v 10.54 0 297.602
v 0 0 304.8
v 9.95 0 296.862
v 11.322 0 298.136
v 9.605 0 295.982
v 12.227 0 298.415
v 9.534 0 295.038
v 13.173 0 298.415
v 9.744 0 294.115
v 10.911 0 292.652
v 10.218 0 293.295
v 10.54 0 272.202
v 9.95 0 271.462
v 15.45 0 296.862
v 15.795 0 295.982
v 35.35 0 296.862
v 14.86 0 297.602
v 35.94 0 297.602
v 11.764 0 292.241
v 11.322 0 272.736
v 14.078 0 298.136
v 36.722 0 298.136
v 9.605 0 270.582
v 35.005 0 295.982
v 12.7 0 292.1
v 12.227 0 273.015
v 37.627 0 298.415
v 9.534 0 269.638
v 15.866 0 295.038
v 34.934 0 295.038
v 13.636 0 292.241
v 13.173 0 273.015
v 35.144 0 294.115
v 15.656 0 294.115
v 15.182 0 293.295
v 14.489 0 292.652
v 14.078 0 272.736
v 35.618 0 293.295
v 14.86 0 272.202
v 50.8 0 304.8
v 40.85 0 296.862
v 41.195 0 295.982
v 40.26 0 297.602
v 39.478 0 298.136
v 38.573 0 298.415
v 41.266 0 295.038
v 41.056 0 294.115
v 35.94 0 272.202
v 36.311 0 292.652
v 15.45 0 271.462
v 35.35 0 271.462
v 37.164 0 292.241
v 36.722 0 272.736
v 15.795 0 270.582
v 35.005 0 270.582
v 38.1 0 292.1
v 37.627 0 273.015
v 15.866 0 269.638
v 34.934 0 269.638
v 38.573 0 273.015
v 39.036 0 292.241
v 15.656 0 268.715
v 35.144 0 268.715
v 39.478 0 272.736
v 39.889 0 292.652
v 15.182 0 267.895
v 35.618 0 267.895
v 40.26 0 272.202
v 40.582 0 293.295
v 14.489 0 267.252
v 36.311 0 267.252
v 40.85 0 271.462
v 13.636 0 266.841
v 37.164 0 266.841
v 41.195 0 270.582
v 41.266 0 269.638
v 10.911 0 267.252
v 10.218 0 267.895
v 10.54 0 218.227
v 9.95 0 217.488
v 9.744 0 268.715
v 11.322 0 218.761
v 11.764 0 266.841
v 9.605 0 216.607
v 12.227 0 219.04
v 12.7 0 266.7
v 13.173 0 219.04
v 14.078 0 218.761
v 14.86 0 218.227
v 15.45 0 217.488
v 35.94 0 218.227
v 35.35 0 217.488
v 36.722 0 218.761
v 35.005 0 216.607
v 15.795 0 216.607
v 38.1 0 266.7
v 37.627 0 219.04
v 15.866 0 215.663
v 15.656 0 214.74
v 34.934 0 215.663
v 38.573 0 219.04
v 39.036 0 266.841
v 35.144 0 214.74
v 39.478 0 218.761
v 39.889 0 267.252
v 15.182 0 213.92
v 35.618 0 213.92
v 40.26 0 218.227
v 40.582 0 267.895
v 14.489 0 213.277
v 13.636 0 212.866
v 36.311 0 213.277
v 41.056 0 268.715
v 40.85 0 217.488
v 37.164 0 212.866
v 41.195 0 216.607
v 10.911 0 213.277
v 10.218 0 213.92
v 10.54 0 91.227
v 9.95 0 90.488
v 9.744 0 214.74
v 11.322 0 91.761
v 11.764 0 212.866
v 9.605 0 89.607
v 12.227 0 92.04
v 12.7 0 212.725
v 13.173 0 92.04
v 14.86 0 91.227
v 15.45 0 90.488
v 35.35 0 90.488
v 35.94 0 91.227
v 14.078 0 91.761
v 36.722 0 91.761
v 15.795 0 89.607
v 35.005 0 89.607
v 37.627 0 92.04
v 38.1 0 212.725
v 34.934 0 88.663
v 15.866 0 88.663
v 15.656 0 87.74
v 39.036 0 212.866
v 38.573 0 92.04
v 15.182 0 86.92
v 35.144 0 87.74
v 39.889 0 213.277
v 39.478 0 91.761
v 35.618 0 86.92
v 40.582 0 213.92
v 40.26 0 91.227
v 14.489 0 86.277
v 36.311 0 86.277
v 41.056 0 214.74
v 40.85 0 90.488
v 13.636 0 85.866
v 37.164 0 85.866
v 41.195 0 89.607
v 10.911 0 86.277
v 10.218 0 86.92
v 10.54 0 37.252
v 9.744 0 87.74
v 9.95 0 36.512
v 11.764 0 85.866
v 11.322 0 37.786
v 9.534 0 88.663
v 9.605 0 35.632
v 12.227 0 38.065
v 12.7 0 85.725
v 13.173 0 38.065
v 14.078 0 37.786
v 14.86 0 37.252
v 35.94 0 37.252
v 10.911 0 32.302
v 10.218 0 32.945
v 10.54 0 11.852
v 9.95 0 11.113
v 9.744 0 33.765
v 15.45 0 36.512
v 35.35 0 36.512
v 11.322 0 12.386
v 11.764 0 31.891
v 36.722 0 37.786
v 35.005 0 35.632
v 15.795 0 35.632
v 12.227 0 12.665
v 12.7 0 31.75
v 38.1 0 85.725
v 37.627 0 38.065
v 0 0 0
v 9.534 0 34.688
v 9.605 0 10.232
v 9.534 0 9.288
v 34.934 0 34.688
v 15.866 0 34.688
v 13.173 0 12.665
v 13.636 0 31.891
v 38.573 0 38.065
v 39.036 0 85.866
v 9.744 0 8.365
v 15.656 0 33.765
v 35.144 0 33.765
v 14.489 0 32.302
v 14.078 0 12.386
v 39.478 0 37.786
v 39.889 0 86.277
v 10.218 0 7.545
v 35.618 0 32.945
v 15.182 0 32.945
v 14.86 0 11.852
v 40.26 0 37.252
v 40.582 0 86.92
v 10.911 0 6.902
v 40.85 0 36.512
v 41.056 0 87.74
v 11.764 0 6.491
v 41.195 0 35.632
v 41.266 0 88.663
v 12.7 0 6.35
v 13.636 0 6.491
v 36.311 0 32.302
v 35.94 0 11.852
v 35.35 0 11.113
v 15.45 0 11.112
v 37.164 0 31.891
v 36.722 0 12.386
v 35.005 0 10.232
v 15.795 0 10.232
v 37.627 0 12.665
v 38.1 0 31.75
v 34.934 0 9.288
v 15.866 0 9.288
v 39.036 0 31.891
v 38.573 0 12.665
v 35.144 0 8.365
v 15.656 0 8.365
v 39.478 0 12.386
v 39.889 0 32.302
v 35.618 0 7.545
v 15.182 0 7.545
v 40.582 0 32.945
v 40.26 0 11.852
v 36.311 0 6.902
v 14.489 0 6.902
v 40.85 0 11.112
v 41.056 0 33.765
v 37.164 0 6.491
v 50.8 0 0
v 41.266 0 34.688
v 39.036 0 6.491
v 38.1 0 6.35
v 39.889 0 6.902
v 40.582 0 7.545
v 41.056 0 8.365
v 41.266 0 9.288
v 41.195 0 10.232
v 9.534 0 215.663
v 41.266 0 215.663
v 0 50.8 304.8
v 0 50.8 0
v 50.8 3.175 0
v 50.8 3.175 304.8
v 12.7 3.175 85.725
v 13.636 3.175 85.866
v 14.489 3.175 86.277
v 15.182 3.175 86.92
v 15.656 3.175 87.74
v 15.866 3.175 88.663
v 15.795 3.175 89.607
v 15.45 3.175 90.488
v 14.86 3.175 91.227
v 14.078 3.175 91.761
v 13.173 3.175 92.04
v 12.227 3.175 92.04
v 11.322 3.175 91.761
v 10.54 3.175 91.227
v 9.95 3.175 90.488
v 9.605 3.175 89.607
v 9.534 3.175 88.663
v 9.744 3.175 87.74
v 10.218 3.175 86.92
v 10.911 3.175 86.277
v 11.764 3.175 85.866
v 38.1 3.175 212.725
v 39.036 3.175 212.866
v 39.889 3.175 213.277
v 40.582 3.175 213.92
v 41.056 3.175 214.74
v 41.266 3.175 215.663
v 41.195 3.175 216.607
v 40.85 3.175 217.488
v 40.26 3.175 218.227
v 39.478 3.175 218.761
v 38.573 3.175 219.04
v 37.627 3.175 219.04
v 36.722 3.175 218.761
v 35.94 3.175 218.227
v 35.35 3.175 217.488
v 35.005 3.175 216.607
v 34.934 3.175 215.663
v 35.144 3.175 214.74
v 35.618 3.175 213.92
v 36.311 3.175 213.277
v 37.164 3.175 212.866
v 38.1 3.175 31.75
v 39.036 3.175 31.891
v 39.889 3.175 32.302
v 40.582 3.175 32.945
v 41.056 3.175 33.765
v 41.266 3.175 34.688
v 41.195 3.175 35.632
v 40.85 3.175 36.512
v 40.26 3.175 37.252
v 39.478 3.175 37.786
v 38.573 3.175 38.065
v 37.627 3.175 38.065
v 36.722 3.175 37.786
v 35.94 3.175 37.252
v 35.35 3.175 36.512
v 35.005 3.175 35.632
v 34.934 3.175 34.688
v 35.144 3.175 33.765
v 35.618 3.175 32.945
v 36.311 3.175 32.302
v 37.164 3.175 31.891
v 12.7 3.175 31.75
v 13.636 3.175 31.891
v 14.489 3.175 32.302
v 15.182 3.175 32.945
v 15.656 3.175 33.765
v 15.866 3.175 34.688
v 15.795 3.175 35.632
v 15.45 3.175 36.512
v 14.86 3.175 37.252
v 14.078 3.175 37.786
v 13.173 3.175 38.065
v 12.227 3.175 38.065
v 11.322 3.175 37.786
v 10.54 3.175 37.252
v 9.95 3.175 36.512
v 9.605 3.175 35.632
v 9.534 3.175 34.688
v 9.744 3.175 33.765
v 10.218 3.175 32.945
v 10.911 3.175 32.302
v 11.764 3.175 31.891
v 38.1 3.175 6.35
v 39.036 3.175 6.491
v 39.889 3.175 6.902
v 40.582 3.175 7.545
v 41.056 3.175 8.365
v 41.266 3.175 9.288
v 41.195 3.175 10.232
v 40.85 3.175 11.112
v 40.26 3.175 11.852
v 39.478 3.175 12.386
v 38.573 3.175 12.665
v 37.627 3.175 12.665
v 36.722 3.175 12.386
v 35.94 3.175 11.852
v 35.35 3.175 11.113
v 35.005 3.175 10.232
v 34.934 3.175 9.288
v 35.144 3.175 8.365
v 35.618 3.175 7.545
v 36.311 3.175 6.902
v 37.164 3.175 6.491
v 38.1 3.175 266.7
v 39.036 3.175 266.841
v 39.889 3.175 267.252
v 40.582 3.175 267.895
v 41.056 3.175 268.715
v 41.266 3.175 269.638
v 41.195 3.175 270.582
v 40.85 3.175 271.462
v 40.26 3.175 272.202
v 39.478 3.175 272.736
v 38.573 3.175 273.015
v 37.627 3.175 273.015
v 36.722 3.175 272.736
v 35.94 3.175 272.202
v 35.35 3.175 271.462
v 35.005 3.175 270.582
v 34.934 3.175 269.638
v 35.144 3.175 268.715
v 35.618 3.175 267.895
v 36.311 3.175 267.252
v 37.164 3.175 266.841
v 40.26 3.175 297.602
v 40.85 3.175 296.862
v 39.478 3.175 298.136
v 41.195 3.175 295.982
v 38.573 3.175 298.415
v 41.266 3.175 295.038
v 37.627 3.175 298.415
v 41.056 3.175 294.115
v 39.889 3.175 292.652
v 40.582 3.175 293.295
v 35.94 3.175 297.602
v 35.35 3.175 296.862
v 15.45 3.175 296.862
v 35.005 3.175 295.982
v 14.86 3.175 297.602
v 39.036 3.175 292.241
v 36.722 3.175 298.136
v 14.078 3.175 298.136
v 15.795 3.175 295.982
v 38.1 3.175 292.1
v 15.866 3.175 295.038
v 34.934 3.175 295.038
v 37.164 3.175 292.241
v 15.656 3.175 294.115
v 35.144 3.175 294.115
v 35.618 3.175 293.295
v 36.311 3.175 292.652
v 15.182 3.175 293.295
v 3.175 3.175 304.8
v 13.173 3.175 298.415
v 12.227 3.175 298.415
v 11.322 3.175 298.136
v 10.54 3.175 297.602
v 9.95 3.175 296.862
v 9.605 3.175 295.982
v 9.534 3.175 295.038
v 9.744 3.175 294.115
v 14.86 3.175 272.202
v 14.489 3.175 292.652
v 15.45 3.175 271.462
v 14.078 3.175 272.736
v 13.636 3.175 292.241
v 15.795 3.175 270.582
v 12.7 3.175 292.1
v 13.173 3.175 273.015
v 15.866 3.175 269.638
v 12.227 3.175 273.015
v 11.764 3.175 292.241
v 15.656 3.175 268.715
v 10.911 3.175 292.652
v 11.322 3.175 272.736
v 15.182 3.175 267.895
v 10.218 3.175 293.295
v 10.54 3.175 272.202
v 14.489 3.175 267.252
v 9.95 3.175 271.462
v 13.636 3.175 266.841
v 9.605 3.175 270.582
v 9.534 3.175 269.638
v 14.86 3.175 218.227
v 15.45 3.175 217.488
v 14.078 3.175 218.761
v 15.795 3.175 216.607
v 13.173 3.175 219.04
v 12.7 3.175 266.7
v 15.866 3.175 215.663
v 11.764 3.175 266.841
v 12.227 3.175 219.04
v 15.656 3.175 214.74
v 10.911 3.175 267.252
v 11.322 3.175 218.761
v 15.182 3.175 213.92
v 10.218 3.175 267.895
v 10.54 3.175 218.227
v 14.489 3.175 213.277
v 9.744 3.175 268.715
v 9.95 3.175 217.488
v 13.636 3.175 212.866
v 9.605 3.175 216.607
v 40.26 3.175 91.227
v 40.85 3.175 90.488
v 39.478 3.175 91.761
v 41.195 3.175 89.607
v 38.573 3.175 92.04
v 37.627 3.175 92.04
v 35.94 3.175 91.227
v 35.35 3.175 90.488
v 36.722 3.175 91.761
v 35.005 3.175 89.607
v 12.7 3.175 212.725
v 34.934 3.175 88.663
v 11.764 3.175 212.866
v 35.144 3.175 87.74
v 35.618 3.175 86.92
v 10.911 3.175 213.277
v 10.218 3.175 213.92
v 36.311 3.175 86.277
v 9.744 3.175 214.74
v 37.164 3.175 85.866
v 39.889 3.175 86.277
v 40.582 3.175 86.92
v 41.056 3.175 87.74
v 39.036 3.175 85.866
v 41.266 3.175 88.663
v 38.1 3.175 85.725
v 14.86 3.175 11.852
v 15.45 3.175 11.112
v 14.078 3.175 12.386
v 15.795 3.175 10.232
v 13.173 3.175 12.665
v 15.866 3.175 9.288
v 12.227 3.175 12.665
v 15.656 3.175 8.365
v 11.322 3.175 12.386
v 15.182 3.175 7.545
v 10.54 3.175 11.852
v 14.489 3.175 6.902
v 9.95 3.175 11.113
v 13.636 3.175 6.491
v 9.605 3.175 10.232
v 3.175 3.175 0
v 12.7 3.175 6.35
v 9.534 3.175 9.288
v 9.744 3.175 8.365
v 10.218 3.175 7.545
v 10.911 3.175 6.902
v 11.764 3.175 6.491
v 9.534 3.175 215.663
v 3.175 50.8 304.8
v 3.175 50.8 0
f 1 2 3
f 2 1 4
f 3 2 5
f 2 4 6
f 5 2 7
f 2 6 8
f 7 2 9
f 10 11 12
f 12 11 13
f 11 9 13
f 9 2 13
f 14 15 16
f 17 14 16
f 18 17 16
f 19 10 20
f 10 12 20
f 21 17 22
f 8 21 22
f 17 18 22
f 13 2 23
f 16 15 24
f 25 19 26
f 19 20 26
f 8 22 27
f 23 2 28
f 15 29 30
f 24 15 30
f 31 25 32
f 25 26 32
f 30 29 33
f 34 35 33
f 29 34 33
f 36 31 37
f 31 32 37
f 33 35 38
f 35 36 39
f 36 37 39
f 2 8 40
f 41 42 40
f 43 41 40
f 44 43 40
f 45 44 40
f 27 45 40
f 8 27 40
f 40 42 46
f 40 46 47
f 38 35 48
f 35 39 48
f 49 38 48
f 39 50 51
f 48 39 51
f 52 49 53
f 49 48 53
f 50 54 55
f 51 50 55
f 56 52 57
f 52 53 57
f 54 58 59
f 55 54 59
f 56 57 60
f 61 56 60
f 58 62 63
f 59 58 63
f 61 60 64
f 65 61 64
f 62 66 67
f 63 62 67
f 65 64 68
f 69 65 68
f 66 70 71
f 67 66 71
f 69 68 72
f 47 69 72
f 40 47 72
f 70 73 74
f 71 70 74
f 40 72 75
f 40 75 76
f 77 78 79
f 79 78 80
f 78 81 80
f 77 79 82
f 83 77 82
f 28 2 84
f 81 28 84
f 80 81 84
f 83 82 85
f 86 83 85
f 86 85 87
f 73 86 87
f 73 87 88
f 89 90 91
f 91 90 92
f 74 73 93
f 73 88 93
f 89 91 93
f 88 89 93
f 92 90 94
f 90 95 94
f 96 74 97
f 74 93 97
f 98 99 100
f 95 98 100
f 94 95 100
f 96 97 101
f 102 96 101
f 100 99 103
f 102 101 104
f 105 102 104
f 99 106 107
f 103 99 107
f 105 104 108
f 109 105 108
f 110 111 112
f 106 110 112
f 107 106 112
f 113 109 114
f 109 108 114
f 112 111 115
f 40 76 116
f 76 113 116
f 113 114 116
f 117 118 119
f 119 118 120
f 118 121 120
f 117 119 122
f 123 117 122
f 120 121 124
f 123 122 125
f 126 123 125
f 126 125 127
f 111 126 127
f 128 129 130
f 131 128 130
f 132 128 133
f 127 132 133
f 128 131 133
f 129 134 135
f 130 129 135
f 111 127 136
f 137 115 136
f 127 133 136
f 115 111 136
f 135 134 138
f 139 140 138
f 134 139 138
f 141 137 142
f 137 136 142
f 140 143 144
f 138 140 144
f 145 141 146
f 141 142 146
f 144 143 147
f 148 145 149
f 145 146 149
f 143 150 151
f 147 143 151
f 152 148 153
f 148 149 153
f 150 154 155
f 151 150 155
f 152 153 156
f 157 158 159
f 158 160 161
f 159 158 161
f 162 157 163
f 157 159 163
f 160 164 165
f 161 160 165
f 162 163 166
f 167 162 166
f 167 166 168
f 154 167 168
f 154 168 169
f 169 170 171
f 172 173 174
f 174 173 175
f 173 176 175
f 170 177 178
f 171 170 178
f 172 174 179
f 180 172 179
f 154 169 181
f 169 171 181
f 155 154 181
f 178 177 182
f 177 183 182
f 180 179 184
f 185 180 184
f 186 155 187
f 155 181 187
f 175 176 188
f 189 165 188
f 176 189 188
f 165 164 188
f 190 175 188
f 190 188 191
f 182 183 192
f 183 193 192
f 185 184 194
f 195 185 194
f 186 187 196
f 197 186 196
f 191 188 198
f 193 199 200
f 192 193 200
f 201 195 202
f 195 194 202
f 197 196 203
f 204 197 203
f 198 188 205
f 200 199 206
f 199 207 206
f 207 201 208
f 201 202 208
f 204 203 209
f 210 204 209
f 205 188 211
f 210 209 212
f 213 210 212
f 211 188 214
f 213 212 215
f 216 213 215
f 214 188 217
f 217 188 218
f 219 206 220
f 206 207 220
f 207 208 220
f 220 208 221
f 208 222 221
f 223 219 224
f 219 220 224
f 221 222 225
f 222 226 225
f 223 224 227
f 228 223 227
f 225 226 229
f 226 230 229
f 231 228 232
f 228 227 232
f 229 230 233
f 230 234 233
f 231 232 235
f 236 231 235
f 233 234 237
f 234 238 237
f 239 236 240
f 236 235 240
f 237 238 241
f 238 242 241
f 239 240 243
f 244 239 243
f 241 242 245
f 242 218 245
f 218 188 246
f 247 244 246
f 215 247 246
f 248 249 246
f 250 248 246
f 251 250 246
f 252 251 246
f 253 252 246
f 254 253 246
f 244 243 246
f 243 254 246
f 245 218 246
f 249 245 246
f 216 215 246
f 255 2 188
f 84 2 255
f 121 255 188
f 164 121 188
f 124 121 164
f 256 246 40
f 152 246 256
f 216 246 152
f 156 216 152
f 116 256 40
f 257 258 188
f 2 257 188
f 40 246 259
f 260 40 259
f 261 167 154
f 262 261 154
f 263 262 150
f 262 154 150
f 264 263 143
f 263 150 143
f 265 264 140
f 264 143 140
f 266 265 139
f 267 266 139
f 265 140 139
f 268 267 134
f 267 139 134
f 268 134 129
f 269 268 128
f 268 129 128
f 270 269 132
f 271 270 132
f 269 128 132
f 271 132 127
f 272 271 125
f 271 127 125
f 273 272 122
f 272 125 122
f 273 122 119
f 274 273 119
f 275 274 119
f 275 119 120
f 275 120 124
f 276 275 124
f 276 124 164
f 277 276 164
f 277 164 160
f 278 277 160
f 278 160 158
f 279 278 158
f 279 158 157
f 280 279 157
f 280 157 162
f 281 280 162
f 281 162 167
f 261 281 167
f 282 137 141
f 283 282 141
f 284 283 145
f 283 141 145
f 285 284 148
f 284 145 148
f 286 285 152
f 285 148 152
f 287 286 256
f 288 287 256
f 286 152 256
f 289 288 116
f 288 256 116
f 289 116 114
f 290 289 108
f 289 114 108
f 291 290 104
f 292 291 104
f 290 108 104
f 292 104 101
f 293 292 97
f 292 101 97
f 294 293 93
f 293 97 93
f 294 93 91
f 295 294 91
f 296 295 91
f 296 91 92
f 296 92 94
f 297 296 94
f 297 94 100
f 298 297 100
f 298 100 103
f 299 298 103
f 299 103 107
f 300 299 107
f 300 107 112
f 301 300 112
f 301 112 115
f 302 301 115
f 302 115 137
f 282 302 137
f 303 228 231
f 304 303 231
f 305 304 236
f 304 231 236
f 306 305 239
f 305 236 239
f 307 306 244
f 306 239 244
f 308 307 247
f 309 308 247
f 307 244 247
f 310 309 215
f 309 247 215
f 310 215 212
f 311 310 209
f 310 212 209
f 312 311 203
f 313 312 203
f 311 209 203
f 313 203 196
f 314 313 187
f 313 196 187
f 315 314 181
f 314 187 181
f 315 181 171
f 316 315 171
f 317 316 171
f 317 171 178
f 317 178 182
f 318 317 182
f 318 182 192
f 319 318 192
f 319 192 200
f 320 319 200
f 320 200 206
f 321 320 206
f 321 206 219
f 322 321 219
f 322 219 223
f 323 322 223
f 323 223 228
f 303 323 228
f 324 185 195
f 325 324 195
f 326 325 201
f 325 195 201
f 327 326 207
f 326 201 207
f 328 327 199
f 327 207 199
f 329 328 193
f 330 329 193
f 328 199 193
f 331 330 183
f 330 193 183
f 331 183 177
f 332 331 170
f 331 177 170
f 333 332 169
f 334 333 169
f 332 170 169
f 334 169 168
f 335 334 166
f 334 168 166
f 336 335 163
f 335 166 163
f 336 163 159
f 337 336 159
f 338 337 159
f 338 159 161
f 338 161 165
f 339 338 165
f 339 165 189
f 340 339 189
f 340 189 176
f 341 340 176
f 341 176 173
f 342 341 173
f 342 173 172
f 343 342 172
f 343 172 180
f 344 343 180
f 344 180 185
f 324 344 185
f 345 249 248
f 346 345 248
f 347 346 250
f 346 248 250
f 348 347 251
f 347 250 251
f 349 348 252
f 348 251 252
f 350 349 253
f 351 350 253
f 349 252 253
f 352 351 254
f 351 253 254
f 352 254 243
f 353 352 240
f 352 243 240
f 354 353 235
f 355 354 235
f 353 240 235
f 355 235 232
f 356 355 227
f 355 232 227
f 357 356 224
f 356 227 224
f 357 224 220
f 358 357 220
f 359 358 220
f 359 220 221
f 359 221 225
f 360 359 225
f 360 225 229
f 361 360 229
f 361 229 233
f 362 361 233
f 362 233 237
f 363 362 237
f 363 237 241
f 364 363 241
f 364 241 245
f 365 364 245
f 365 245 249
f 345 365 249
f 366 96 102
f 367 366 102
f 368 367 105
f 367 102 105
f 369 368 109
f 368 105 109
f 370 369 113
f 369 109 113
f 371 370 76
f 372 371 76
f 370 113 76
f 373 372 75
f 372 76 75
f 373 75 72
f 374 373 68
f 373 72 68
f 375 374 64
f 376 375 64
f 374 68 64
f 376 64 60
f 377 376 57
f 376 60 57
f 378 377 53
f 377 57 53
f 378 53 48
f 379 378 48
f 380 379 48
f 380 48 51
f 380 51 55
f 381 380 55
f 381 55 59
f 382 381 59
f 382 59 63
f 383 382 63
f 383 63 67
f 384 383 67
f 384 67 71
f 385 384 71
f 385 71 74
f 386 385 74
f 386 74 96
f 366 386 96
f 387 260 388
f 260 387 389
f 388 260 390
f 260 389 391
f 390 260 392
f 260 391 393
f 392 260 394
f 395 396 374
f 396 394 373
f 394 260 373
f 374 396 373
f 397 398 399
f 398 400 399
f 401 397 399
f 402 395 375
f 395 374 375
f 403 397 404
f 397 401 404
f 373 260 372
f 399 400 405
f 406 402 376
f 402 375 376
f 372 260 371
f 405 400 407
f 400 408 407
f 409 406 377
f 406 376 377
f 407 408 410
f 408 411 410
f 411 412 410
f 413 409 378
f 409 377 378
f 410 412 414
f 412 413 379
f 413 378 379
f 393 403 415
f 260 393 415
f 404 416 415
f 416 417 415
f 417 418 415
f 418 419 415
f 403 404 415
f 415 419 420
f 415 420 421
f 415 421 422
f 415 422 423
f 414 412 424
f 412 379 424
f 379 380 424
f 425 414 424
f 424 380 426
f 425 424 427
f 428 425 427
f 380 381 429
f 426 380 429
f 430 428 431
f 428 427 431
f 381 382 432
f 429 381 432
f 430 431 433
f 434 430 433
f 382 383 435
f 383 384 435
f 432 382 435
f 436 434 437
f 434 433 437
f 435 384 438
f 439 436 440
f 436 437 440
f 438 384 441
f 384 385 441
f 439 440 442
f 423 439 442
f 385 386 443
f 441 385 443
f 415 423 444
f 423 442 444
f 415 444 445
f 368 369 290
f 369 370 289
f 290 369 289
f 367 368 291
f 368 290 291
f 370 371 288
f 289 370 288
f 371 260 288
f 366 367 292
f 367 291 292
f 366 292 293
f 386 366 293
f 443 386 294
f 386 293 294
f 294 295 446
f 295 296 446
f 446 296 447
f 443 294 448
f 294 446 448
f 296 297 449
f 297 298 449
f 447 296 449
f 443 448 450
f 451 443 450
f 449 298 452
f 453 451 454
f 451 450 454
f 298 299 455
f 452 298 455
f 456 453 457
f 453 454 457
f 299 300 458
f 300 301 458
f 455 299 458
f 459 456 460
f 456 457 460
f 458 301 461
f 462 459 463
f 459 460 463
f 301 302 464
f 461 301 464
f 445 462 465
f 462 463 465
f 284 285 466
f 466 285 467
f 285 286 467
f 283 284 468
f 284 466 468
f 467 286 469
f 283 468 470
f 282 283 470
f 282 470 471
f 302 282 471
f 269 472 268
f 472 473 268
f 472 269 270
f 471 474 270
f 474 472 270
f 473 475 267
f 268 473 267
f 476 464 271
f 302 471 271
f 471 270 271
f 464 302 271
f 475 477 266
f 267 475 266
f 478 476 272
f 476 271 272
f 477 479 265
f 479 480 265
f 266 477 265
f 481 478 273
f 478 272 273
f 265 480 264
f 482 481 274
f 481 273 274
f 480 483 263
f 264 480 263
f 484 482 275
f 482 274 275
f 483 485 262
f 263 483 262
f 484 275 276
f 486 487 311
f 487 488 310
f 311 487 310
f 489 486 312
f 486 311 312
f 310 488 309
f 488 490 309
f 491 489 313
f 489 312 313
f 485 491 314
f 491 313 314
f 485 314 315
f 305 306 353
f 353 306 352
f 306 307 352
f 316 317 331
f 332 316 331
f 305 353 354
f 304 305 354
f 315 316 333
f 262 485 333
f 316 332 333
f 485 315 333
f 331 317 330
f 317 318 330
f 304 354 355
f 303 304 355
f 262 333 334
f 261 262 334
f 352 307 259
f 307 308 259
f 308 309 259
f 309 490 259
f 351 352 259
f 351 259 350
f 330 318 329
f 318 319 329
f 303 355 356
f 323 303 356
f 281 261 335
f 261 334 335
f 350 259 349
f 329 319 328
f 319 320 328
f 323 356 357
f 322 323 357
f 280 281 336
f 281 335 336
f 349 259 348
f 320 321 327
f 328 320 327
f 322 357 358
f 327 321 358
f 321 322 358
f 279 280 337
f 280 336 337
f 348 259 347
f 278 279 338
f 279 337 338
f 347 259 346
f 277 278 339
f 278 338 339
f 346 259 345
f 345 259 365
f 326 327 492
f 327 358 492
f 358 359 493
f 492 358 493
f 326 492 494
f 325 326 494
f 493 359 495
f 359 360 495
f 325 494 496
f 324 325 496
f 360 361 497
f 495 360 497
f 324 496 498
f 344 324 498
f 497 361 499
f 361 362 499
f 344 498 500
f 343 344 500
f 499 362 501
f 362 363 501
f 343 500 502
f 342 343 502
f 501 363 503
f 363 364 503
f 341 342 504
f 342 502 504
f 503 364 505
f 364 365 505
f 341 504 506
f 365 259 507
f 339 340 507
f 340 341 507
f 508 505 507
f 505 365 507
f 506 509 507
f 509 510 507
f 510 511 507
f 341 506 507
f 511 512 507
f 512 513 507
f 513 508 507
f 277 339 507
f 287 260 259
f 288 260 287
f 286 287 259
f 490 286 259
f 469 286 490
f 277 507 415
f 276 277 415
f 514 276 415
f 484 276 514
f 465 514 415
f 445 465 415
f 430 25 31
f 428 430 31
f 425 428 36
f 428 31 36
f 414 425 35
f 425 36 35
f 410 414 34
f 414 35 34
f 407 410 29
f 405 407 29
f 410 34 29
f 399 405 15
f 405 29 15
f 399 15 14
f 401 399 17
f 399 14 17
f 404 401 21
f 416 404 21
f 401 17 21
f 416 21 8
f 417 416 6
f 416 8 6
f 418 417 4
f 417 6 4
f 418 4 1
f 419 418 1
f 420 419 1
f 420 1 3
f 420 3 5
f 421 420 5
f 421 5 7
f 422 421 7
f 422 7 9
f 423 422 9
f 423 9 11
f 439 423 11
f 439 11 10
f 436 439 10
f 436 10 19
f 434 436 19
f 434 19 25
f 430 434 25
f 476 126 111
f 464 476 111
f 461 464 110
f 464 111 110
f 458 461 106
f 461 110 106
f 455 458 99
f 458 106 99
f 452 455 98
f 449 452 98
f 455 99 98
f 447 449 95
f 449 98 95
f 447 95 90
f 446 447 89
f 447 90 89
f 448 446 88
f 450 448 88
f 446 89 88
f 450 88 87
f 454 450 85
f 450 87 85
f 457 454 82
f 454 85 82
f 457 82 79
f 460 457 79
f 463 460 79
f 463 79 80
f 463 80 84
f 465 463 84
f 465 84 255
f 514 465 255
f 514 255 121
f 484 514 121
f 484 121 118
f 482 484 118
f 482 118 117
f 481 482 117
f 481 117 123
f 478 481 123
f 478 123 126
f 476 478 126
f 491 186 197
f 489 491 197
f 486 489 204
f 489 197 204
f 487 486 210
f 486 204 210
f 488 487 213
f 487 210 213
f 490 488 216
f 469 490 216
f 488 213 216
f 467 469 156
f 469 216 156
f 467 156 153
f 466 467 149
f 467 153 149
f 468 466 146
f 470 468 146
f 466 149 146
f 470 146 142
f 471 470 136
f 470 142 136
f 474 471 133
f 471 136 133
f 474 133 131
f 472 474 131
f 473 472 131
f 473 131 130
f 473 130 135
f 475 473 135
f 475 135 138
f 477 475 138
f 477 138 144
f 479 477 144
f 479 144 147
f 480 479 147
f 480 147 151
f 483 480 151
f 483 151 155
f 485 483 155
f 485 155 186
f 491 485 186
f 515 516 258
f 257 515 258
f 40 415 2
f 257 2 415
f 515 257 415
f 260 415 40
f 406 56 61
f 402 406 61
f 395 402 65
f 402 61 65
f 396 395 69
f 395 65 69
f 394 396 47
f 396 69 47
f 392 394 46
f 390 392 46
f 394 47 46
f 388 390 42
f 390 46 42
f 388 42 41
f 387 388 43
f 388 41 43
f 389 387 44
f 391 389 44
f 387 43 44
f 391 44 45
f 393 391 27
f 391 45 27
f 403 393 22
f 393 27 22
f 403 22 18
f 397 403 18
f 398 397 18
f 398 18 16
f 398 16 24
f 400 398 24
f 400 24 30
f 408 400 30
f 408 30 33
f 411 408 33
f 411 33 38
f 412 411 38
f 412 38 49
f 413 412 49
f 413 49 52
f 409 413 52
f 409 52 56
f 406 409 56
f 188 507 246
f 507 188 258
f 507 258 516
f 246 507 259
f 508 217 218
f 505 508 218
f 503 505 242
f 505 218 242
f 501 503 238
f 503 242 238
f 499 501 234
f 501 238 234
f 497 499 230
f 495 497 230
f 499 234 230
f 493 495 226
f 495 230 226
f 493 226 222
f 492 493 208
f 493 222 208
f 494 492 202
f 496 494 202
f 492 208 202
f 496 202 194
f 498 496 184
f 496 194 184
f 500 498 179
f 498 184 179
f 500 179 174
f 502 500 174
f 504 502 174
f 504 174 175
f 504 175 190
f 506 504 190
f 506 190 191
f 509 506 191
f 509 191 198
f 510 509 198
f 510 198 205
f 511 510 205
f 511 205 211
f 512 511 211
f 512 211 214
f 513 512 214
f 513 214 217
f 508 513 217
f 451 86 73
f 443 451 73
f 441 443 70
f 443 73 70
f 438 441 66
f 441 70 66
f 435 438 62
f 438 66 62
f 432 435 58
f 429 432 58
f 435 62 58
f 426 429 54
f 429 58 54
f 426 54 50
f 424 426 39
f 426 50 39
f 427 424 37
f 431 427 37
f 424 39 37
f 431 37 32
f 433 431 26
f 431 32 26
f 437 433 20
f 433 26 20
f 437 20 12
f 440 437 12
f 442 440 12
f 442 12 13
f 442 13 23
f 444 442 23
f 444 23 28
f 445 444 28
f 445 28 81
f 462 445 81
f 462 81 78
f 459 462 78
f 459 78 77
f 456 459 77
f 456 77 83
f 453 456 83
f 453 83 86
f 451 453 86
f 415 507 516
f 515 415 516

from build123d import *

# Parameters (mm, degrees)
BOSS_EXTRUDE1_DEPTH = 304.8
SKETCH2_R           = 3.175
CUT_EXTRUDE1_DEPTH  = 314.152231351


with BuildPart() as part:
    # Sketch1 → Boss-Extrude1 (new body)
    with BuildSketch(Plane.XY):
        Polygon((0, 0), (50.8, 0), (50.8, 3.175), (3.175, 3.175), (3.175, 50.8), (0, 50.8), align=None)
    extrude(amount=BOSS_EXTRUDE1_DEPTH)

    # Sketch2 → Cut-Extrude1 (cut, through all)
    with BuildSketch(Plane.XZ):
        with Locations(Location((12.7, 9.525, 0), (0, 0, 270))):
            Circle(SKETCH2_R)
        with Locations(Location((12.7, 34.925, 0), (0, 0, 270))):
            Circle(SKETCH2_R)
        with Locations(Location((38.1, 34.925, 0), (0, 0, 270))):
            Circle(SKETCH2_R)
        with Locations(Location((38.1, 9.525, 0), (0, 0, 270))):
            Circle(SKETCH2_R)
        with Locations(Location((12.7, 215.9, 0), (0, 0, 270))):
            Circle(SKETCH2_R)
        with Locations(Location((38.1, 215.9, 0), (0, 0, 270))):
            Circle(SKETCH2_R)
        with Locations(Location((38.1, 88.9, 0), (0, 0, 270))):
            Circle(SKETCH2_R)
        with Locations(Location((12.7, 88.9, 0), (0, 0, 270))):
            Circle(SKETCH2_R)
        with Locations(Location((12.7, 295.275, 0), (0, 0, 270))):
            Circle(SKETCH2_R)
        with Locations(Location((12.7, 269.875, 0), (0, 0, 270))):
            Circle(SKETCH2_R)
        with Locations(Location((38.1, 269.875, 0), (0, 0, 270))):
            Circle(SKETCH2_R)
        with Locations(Location((38.1, 295.275, 0), (0, 0, 270))):
            Circle(SKETCH2_R)
    extrude(amount=-CUT_EXTRUDE1_DEPTH, mode=Mode.SUBTRACT)


solid = part.part
